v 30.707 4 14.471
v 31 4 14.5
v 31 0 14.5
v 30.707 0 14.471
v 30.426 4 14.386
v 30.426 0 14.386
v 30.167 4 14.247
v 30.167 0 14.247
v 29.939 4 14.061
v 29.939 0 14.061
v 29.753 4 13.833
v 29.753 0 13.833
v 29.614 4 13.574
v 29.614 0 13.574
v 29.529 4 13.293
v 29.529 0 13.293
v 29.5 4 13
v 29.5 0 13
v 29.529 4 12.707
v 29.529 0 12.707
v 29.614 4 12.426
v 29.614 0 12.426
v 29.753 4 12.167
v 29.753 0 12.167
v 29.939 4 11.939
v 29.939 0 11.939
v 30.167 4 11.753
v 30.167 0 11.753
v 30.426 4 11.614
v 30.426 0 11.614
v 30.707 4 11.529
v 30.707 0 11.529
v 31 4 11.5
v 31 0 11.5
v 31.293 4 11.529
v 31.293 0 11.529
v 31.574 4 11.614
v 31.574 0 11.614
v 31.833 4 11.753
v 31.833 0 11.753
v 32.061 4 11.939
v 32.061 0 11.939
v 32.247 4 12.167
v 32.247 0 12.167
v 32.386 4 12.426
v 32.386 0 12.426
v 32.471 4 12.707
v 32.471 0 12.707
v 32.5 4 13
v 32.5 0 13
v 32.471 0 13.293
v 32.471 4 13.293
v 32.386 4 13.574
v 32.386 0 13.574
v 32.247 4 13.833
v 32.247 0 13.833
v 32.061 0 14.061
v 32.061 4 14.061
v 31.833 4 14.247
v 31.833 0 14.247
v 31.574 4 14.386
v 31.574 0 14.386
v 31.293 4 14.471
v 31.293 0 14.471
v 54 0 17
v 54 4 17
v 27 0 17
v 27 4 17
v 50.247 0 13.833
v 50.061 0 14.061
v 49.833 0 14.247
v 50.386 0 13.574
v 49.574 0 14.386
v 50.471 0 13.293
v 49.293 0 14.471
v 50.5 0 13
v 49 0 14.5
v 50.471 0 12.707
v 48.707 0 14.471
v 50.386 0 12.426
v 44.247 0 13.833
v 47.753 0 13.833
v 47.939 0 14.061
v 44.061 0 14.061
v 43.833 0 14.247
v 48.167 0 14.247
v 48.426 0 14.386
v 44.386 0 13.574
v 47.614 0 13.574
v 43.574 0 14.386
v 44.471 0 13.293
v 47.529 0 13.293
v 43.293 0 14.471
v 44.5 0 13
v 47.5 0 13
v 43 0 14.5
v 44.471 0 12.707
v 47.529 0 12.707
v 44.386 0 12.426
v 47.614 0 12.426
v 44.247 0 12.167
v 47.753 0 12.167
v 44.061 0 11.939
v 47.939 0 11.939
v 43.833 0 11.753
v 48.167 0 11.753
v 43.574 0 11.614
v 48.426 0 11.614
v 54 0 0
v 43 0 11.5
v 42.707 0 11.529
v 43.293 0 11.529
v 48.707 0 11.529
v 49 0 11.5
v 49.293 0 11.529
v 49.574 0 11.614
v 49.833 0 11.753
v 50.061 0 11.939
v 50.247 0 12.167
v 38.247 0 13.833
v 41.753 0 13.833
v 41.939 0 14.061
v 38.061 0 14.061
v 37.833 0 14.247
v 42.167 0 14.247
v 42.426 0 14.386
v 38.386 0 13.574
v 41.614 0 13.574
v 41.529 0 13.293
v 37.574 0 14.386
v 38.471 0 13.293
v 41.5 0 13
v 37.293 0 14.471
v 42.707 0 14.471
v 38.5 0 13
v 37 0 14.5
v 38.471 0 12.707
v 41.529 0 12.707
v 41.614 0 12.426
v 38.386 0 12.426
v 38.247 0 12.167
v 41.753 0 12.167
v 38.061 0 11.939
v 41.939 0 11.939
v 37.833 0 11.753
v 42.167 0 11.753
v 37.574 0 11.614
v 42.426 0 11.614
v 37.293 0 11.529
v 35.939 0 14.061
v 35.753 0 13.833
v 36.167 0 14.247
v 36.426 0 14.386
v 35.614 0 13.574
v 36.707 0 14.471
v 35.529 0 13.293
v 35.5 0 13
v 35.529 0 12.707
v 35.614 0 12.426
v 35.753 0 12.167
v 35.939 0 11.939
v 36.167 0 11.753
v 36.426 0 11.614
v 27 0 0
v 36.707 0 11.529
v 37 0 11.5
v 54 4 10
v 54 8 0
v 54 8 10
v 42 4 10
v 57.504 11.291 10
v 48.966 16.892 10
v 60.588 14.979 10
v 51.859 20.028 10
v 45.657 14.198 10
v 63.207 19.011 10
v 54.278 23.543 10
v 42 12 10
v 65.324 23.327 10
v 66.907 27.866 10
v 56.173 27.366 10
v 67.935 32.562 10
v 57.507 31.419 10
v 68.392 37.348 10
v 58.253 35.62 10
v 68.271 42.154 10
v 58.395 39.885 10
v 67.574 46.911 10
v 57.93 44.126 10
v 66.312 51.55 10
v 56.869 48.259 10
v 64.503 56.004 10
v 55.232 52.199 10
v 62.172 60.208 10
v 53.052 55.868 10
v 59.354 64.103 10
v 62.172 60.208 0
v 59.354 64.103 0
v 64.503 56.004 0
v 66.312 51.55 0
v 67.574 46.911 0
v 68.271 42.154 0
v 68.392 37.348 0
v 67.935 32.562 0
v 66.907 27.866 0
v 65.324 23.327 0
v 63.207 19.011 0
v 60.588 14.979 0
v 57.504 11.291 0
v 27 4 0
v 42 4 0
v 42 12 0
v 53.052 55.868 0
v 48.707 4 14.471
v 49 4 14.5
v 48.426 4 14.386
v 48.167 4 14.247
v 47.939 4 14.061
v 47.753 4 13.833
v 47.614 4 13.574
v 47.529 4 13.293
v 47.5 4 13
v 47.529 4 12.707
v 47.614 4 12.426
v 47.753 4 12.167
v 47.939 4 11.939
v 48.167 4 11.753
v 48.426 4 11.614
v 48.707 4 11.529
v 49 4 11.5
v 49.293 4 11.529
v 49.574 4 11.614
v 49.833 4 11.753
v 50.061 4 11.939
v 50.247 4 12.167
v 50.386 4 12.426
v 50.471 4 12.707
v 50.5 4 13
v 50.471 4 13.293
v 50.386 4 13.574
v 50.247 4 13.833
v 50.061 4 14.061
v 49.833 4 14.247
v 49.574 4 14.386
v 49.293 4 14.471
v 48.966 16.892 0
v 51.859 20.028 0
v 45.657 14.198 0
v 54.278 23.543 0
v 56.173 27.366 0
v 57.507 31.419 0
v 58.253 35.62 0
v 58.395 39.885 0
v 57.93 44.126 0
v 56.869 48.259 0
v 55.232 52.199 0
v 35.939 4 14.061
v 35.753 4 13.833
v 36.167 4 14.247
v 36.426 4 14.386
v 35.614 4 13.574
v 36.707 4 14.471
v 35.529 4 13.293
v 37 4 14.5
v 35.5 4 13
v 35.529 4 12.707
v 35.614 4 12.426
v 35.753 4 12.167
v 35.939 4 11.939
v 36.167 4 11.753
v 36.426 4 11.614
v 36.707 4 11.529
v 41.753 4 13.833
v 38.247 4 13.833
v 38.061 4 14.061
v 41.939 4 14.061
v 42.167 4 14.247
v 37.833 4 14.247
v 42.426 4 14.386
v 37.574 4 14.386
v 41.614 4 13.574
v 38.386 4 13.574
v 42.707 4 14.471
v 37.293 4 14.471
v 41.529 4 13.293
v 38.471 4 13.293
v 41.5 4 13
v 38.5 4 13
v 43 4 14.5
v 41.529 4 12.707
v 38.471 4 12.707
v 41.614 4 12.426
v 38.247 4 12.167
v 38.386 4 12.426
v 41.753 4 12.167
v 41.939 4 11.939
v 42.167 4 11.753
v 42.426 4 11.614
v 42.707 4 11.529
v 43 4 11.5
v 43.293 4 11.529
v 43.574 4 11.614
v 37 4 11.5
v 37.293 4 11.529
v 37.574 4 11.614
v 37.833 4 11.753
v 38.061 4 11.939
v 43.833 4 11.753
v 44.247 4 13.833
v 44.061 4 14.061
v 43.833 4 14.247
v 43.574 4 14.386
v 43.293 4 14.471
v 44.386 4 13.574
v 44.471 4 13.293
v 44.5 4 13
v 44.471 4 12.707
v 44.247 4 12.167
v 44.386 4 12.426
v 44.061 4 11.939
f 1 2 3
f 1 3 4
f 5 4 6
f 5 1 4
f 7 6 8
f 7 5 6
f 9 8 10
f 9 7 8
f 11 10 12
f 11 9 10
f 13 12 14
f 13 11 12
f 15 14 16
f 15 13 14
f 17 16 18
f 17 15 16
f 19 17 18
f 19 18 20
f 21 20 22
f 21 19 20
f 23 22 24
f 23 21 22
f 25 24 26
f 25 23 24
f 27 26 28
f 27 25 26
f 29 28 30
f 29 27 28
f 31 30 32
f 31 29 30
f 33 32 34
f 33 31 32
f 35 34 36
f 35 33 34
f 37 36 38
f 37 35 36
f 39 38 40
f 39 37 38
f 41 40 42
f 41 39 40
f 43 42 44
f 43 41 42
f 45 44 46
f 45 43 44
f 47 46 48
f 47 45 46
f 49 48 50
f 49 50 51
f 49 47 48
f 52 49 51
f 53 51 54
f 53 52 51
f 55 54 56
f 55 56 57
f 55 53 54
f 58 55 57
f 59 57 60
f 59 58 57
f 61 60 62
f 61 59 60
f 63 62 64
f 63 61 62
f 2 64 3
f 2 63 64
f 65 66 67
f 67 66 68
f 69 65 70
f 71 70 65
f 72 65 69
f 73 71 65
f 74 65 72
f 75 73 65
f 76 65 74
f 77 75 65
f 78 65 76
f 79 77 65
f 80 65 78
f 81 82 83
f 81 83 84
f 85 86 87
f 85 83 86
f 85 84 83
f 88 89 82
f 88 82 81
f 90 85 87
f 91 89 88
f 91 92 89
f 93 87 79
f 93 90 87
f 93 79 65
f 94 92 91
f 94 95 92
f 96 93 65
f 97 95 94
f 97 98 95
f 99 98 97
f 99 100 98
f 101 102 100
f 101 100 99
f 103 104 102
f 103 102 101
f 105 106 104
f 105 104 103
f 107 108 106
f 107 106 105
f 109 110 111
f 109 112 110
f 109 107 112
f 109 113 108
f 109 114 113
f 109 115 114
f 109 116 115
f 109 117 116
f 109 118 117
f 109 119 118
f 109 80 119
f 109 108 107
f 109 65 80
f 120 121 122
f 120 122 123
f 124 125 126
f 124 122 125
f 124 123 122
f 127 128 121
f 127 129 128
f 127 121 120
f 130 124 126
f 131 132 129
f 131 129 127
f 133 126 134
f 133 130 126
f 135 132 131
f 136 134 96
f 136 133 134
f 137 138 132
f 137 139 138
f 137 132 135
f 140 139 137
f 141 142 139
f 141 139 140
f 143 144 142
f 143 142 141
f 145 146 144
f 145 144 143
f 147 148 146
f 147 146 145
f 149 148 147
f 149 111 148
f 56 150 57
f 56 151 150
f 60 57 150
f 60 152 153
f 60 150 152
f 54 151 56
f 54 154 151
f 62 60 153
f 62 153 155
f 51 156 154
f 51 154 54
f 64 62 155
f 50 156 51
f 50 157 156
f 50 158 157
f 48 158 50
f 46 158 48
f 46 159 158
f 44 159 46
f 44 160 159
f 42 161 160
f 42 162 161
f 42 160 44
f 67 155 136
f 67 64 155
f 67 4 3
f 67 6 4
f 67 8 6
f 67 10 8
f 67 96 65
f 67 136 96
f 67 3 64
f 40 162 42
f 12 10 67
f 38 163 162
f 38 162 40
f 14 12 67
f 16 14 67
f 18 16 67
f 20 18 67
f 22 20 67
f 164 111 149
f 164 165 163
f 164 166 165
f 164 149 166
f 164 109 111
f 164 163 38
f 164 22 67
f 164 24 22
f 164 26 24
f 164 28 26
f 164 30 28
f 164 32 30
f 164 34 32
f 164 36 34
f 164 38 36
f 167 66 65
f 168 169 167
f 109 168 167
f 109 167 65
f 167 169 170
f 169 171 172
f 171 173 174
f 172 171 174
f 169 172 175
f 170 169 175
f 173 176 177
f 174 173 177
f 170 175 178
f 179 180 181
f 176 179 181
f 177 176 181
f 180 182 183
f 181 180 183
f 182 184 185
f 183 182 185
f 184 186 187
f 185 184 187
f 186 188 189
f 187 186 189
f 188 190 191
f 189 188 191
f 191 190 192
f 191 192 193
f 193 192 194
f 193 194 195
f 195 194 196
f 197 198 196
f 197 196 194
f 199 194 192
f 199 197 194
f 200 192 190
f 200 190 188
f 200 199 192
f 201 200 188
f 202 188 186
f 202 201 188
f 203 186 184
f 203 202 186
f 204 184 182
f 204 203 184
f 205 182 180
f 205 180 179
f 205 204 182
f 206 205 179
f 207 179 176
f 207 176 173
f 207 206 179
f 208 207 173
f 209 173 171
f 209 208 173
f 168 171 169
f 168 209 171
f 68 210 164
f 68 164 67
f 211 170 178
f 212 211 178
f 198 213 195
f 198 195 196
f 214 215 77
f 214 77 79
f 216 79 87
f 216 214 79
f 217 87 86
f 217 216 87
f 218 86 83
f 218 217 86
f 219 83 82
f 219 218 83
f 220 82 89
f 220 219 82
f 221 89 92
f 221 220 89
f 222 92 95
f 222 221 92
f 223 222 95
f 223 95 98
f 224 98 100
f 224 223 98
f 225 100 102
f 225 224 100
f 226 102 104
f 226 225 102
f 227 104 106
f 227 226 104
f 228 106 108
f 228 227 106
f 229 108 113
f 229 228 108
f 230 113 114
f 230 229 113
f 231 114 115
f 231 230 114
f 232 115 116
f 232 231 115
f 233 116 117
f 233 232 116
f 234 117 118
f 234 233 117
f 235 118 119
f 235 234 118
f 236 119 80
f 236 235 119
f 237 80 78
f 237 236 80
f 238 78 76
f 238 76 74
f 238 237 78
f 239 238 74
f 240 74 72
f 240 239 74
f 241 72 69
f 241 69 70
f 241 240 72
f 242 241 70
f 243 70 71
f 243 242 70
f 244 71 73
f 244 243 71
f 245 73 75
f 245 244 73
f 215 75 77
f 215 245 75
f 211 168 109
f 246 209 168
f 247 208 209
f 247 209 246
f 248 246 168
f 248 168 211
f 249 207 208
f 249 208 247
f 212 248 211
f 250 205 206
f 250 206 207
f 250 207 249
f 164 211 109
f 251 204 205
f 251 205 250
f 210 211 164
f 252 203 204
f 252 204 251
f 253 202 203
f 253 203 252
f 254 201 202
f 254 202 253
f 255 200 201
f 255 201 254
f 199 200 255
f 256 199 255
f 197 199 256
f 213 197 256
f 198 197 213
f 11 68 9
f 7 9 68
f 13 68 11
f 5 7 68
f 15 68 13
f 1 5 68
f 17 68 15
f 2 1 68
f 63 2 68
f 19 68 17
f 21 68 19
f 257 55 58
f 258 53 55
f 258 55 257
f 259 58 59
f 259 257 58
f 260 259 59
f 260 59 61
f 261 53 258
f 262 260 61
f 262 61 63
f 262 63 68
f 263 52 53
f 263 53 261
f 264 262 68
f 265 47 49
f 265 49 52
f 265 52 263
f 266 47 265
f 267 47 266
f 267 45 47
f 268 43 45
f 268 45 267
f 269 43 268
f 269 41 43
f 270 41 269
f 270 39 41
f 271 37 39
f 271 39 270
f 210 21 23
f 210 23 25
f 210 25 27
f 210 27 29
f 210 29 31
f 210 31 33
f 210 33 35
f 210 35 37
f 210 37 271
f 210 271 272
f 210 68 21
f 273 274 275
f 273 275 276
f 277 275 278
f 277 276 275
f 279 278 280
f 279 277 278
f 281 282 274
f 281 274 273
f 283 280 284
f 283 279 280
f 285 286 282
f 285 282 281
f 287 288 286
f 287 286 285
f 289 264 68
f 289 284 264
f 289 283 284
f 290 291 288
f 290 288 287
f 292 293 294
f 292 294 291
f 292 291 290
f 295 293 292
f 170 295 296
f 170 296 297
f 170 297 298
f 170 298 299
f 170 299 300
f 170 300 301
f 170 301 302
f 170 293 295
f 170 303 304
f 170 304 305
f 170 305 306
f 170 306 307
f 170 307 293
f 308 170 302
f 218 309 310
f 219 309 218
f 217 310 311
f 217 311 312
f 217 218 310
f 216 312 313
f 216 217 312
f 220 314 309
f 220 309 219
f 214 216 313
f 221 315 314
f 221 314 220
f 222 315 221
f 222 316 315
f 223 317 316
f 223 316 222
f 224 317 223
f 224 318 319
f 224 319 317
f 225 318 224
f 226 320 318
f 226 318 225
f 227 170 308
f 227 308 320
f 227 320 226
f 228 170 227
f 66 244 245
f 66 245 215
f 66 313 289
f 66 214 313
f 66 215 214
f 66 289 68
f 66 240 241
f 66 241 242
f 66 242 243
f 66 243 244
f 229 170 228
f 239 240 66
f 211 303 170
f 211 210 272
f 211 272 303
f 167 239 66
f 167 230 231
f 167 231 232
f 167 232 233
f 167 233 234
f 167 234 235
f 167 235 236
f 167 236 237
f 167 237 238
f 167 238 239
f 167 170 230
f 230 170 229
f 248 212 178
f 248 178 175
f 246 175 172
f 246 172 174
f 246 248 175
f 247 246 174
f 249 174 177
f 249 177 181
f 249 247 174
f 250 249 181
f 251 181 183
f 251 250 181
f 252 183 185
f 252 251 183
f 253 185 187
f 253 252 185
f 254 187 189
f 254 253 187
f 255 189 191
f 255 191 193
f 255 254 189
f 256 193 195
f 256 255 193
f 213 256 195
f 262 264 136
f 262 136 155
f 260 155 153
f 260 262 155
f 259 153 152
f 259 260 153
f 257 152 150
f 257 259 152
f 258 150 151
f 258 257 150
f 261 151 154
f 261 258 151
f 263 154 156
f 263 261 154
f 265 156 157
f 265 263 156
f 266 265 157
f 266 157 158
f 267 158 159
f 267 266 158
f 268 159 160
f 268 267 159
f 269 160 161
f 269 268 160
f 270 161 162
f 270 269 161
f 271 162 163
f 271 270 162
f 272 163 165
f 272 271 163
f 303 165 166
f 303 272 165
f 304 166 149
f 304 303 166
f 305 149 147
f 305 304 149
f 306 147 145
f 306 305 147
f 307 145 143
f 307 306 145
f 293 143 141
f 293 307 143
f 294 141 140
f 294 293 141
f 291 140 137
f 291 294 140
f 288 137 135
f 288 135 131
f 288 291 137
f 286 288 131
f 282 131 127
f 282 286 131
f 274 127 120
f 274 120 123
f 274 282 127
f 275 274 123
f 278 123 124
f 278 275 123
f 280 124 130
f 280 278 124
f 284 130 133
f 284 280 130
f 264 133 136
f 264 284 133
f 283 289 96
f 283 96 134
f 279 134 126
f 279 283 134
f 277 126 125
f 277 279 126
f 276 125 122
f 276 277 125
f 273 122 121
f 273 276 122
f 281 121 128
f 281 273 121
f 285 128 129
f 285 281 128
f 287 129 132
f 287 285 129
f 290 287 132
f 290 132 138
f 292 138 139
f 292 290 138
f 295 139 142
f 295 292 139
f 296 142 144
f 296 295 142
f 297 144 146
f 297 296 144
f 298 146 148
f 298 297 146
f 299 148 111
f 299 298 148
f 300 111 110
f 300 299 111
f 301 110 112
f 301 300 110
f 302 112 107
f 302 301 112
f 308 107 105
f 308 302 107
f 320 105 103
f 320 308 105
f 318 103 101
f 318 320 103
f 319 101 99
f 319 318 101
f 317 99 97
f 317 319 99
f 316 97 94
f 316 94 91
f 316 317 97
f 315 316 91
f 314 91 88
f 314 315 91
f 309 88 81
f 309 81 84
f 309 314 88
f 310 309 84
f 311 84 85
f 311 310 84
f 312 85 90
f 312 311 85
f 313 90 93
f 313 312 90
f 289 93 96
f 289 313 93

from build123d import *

# Parameters (mm, degrees)
BOSS_EXTRUDE1_DEPTH     = 10
SKETCH3_W               = 27
SKETCH3_H               = 4
BOSS_EXTRUDE2_DEPTH     = 17
SKETCH4_R               = 1.5
CUT_EXTRUDE1_DEPTH      = 4
CUT_EXTRUDE2_DEPTH      = 15
CUT_EXTRUDE2_DEPTH_BACK = 27
SKETCH5_W               = 24.801401456
SKETCH5_H               = 70.149949376


with BuildPart() as part:
    # Sketch1 → Boss-Extrude1 (new body)
    with BuildSketch(Plane.XY):
        with BuildLine():
            Line((0.947795447, 55.867567374), (-5.354013975, 64.102890964))
            ThreePointArc((-5.354013975, 64.102890964), (-14.235235054, 34.948420067), (0, 8))
            Line((0, 8), (0, 4))
            Line((0, 4), (0, 0))
            Line((0, 0), (27, 0))
            Line((27, 0), (27, 4))
            Line((27, 4), (12, 4))
            Line((12, 4), (12, 12))
            ThreePointArc((12, 12), (-3.507060252, 31.419133439), (0.947795447, 55.867567374))
        make_face()
    boss_extrude1 = extrude(amount=BOSS_EXTRUDE1_DEPTH)

    # Sketch3 → Boss-Extrude2 (add)
    with BuildSketch(Plane.XY):
        with Locations((13.5, 2)):
            Rectangle(SKETCH3_W, SKETCH3_H)
    boss_extrude2 = extrude(amount=BOSS_EXTRUDE2_DEPTH)

    # Sketch4 → Cut-Extrude1 (cut)
    with BuildSketch(Plane(origin=(0, 4, 0), x_dir=(1, 0, 0), z_dir=(0, 1, 0))):
        with Locations(Location((5, -13, 0), (0, 0, 270))):
            Circle(SKETCH4_R)
        with Locations(Location((11, -13, 0), (0, 0, 270))):
            Circle(SKETCH4_R)
        with Locations(Location((17, -13, 0), (0, 0, 270))):
            Circle(SKETCH4_R)
        with Locations(Location((23, -13, 0), (0, 0, 270))):
            Circle(SKETCH4_R)
    cut_extrude1 = extrude(amount=-CUT_EXTRUDE1_DEPTH, mode=Mode.SUBTRACT)

    # Mirror8: Boss-Extrude1, Boss-Extrude2, Cut-Extrude1 across plane
    add(boss_extrude1.mirror(Plane(origin=(27, 0, 10), x_dir=(0, 0, 1), z_dir=(-1, 0, 0))))
    add(boss_extrude2.mirror(Plane(origin=(27, 0, 10), x_dir=(0, 0, 1), z_dir=(-1, 0, 0))))
    add(cut_extrude1.mirror(Plane(origin=(27, 0, 10), x_dir=(0, 0, 1), z_dir=(-1, 0, 0))), mode=Mode.SUBTRACT)

    # Sketch5 → Cut-Extrude2 (cut, two sides: drawn at the far end of the back side and taken through both)
    with BuildSketch(Plane.ZY.offset(-CUT_EXTRUDE2_DEPTH_BACK)):
        with Locations((8.5, 31.779897291)):
            Rectangle(SKETCH5_W, SKETCH5_H)
    extrude(amount=CUT_EXTRUDE2_DEPTH + CUT_EXTRUDE2_DEPTH_BACK, mode=Mode.SUBTRACT)


solid = part.part
